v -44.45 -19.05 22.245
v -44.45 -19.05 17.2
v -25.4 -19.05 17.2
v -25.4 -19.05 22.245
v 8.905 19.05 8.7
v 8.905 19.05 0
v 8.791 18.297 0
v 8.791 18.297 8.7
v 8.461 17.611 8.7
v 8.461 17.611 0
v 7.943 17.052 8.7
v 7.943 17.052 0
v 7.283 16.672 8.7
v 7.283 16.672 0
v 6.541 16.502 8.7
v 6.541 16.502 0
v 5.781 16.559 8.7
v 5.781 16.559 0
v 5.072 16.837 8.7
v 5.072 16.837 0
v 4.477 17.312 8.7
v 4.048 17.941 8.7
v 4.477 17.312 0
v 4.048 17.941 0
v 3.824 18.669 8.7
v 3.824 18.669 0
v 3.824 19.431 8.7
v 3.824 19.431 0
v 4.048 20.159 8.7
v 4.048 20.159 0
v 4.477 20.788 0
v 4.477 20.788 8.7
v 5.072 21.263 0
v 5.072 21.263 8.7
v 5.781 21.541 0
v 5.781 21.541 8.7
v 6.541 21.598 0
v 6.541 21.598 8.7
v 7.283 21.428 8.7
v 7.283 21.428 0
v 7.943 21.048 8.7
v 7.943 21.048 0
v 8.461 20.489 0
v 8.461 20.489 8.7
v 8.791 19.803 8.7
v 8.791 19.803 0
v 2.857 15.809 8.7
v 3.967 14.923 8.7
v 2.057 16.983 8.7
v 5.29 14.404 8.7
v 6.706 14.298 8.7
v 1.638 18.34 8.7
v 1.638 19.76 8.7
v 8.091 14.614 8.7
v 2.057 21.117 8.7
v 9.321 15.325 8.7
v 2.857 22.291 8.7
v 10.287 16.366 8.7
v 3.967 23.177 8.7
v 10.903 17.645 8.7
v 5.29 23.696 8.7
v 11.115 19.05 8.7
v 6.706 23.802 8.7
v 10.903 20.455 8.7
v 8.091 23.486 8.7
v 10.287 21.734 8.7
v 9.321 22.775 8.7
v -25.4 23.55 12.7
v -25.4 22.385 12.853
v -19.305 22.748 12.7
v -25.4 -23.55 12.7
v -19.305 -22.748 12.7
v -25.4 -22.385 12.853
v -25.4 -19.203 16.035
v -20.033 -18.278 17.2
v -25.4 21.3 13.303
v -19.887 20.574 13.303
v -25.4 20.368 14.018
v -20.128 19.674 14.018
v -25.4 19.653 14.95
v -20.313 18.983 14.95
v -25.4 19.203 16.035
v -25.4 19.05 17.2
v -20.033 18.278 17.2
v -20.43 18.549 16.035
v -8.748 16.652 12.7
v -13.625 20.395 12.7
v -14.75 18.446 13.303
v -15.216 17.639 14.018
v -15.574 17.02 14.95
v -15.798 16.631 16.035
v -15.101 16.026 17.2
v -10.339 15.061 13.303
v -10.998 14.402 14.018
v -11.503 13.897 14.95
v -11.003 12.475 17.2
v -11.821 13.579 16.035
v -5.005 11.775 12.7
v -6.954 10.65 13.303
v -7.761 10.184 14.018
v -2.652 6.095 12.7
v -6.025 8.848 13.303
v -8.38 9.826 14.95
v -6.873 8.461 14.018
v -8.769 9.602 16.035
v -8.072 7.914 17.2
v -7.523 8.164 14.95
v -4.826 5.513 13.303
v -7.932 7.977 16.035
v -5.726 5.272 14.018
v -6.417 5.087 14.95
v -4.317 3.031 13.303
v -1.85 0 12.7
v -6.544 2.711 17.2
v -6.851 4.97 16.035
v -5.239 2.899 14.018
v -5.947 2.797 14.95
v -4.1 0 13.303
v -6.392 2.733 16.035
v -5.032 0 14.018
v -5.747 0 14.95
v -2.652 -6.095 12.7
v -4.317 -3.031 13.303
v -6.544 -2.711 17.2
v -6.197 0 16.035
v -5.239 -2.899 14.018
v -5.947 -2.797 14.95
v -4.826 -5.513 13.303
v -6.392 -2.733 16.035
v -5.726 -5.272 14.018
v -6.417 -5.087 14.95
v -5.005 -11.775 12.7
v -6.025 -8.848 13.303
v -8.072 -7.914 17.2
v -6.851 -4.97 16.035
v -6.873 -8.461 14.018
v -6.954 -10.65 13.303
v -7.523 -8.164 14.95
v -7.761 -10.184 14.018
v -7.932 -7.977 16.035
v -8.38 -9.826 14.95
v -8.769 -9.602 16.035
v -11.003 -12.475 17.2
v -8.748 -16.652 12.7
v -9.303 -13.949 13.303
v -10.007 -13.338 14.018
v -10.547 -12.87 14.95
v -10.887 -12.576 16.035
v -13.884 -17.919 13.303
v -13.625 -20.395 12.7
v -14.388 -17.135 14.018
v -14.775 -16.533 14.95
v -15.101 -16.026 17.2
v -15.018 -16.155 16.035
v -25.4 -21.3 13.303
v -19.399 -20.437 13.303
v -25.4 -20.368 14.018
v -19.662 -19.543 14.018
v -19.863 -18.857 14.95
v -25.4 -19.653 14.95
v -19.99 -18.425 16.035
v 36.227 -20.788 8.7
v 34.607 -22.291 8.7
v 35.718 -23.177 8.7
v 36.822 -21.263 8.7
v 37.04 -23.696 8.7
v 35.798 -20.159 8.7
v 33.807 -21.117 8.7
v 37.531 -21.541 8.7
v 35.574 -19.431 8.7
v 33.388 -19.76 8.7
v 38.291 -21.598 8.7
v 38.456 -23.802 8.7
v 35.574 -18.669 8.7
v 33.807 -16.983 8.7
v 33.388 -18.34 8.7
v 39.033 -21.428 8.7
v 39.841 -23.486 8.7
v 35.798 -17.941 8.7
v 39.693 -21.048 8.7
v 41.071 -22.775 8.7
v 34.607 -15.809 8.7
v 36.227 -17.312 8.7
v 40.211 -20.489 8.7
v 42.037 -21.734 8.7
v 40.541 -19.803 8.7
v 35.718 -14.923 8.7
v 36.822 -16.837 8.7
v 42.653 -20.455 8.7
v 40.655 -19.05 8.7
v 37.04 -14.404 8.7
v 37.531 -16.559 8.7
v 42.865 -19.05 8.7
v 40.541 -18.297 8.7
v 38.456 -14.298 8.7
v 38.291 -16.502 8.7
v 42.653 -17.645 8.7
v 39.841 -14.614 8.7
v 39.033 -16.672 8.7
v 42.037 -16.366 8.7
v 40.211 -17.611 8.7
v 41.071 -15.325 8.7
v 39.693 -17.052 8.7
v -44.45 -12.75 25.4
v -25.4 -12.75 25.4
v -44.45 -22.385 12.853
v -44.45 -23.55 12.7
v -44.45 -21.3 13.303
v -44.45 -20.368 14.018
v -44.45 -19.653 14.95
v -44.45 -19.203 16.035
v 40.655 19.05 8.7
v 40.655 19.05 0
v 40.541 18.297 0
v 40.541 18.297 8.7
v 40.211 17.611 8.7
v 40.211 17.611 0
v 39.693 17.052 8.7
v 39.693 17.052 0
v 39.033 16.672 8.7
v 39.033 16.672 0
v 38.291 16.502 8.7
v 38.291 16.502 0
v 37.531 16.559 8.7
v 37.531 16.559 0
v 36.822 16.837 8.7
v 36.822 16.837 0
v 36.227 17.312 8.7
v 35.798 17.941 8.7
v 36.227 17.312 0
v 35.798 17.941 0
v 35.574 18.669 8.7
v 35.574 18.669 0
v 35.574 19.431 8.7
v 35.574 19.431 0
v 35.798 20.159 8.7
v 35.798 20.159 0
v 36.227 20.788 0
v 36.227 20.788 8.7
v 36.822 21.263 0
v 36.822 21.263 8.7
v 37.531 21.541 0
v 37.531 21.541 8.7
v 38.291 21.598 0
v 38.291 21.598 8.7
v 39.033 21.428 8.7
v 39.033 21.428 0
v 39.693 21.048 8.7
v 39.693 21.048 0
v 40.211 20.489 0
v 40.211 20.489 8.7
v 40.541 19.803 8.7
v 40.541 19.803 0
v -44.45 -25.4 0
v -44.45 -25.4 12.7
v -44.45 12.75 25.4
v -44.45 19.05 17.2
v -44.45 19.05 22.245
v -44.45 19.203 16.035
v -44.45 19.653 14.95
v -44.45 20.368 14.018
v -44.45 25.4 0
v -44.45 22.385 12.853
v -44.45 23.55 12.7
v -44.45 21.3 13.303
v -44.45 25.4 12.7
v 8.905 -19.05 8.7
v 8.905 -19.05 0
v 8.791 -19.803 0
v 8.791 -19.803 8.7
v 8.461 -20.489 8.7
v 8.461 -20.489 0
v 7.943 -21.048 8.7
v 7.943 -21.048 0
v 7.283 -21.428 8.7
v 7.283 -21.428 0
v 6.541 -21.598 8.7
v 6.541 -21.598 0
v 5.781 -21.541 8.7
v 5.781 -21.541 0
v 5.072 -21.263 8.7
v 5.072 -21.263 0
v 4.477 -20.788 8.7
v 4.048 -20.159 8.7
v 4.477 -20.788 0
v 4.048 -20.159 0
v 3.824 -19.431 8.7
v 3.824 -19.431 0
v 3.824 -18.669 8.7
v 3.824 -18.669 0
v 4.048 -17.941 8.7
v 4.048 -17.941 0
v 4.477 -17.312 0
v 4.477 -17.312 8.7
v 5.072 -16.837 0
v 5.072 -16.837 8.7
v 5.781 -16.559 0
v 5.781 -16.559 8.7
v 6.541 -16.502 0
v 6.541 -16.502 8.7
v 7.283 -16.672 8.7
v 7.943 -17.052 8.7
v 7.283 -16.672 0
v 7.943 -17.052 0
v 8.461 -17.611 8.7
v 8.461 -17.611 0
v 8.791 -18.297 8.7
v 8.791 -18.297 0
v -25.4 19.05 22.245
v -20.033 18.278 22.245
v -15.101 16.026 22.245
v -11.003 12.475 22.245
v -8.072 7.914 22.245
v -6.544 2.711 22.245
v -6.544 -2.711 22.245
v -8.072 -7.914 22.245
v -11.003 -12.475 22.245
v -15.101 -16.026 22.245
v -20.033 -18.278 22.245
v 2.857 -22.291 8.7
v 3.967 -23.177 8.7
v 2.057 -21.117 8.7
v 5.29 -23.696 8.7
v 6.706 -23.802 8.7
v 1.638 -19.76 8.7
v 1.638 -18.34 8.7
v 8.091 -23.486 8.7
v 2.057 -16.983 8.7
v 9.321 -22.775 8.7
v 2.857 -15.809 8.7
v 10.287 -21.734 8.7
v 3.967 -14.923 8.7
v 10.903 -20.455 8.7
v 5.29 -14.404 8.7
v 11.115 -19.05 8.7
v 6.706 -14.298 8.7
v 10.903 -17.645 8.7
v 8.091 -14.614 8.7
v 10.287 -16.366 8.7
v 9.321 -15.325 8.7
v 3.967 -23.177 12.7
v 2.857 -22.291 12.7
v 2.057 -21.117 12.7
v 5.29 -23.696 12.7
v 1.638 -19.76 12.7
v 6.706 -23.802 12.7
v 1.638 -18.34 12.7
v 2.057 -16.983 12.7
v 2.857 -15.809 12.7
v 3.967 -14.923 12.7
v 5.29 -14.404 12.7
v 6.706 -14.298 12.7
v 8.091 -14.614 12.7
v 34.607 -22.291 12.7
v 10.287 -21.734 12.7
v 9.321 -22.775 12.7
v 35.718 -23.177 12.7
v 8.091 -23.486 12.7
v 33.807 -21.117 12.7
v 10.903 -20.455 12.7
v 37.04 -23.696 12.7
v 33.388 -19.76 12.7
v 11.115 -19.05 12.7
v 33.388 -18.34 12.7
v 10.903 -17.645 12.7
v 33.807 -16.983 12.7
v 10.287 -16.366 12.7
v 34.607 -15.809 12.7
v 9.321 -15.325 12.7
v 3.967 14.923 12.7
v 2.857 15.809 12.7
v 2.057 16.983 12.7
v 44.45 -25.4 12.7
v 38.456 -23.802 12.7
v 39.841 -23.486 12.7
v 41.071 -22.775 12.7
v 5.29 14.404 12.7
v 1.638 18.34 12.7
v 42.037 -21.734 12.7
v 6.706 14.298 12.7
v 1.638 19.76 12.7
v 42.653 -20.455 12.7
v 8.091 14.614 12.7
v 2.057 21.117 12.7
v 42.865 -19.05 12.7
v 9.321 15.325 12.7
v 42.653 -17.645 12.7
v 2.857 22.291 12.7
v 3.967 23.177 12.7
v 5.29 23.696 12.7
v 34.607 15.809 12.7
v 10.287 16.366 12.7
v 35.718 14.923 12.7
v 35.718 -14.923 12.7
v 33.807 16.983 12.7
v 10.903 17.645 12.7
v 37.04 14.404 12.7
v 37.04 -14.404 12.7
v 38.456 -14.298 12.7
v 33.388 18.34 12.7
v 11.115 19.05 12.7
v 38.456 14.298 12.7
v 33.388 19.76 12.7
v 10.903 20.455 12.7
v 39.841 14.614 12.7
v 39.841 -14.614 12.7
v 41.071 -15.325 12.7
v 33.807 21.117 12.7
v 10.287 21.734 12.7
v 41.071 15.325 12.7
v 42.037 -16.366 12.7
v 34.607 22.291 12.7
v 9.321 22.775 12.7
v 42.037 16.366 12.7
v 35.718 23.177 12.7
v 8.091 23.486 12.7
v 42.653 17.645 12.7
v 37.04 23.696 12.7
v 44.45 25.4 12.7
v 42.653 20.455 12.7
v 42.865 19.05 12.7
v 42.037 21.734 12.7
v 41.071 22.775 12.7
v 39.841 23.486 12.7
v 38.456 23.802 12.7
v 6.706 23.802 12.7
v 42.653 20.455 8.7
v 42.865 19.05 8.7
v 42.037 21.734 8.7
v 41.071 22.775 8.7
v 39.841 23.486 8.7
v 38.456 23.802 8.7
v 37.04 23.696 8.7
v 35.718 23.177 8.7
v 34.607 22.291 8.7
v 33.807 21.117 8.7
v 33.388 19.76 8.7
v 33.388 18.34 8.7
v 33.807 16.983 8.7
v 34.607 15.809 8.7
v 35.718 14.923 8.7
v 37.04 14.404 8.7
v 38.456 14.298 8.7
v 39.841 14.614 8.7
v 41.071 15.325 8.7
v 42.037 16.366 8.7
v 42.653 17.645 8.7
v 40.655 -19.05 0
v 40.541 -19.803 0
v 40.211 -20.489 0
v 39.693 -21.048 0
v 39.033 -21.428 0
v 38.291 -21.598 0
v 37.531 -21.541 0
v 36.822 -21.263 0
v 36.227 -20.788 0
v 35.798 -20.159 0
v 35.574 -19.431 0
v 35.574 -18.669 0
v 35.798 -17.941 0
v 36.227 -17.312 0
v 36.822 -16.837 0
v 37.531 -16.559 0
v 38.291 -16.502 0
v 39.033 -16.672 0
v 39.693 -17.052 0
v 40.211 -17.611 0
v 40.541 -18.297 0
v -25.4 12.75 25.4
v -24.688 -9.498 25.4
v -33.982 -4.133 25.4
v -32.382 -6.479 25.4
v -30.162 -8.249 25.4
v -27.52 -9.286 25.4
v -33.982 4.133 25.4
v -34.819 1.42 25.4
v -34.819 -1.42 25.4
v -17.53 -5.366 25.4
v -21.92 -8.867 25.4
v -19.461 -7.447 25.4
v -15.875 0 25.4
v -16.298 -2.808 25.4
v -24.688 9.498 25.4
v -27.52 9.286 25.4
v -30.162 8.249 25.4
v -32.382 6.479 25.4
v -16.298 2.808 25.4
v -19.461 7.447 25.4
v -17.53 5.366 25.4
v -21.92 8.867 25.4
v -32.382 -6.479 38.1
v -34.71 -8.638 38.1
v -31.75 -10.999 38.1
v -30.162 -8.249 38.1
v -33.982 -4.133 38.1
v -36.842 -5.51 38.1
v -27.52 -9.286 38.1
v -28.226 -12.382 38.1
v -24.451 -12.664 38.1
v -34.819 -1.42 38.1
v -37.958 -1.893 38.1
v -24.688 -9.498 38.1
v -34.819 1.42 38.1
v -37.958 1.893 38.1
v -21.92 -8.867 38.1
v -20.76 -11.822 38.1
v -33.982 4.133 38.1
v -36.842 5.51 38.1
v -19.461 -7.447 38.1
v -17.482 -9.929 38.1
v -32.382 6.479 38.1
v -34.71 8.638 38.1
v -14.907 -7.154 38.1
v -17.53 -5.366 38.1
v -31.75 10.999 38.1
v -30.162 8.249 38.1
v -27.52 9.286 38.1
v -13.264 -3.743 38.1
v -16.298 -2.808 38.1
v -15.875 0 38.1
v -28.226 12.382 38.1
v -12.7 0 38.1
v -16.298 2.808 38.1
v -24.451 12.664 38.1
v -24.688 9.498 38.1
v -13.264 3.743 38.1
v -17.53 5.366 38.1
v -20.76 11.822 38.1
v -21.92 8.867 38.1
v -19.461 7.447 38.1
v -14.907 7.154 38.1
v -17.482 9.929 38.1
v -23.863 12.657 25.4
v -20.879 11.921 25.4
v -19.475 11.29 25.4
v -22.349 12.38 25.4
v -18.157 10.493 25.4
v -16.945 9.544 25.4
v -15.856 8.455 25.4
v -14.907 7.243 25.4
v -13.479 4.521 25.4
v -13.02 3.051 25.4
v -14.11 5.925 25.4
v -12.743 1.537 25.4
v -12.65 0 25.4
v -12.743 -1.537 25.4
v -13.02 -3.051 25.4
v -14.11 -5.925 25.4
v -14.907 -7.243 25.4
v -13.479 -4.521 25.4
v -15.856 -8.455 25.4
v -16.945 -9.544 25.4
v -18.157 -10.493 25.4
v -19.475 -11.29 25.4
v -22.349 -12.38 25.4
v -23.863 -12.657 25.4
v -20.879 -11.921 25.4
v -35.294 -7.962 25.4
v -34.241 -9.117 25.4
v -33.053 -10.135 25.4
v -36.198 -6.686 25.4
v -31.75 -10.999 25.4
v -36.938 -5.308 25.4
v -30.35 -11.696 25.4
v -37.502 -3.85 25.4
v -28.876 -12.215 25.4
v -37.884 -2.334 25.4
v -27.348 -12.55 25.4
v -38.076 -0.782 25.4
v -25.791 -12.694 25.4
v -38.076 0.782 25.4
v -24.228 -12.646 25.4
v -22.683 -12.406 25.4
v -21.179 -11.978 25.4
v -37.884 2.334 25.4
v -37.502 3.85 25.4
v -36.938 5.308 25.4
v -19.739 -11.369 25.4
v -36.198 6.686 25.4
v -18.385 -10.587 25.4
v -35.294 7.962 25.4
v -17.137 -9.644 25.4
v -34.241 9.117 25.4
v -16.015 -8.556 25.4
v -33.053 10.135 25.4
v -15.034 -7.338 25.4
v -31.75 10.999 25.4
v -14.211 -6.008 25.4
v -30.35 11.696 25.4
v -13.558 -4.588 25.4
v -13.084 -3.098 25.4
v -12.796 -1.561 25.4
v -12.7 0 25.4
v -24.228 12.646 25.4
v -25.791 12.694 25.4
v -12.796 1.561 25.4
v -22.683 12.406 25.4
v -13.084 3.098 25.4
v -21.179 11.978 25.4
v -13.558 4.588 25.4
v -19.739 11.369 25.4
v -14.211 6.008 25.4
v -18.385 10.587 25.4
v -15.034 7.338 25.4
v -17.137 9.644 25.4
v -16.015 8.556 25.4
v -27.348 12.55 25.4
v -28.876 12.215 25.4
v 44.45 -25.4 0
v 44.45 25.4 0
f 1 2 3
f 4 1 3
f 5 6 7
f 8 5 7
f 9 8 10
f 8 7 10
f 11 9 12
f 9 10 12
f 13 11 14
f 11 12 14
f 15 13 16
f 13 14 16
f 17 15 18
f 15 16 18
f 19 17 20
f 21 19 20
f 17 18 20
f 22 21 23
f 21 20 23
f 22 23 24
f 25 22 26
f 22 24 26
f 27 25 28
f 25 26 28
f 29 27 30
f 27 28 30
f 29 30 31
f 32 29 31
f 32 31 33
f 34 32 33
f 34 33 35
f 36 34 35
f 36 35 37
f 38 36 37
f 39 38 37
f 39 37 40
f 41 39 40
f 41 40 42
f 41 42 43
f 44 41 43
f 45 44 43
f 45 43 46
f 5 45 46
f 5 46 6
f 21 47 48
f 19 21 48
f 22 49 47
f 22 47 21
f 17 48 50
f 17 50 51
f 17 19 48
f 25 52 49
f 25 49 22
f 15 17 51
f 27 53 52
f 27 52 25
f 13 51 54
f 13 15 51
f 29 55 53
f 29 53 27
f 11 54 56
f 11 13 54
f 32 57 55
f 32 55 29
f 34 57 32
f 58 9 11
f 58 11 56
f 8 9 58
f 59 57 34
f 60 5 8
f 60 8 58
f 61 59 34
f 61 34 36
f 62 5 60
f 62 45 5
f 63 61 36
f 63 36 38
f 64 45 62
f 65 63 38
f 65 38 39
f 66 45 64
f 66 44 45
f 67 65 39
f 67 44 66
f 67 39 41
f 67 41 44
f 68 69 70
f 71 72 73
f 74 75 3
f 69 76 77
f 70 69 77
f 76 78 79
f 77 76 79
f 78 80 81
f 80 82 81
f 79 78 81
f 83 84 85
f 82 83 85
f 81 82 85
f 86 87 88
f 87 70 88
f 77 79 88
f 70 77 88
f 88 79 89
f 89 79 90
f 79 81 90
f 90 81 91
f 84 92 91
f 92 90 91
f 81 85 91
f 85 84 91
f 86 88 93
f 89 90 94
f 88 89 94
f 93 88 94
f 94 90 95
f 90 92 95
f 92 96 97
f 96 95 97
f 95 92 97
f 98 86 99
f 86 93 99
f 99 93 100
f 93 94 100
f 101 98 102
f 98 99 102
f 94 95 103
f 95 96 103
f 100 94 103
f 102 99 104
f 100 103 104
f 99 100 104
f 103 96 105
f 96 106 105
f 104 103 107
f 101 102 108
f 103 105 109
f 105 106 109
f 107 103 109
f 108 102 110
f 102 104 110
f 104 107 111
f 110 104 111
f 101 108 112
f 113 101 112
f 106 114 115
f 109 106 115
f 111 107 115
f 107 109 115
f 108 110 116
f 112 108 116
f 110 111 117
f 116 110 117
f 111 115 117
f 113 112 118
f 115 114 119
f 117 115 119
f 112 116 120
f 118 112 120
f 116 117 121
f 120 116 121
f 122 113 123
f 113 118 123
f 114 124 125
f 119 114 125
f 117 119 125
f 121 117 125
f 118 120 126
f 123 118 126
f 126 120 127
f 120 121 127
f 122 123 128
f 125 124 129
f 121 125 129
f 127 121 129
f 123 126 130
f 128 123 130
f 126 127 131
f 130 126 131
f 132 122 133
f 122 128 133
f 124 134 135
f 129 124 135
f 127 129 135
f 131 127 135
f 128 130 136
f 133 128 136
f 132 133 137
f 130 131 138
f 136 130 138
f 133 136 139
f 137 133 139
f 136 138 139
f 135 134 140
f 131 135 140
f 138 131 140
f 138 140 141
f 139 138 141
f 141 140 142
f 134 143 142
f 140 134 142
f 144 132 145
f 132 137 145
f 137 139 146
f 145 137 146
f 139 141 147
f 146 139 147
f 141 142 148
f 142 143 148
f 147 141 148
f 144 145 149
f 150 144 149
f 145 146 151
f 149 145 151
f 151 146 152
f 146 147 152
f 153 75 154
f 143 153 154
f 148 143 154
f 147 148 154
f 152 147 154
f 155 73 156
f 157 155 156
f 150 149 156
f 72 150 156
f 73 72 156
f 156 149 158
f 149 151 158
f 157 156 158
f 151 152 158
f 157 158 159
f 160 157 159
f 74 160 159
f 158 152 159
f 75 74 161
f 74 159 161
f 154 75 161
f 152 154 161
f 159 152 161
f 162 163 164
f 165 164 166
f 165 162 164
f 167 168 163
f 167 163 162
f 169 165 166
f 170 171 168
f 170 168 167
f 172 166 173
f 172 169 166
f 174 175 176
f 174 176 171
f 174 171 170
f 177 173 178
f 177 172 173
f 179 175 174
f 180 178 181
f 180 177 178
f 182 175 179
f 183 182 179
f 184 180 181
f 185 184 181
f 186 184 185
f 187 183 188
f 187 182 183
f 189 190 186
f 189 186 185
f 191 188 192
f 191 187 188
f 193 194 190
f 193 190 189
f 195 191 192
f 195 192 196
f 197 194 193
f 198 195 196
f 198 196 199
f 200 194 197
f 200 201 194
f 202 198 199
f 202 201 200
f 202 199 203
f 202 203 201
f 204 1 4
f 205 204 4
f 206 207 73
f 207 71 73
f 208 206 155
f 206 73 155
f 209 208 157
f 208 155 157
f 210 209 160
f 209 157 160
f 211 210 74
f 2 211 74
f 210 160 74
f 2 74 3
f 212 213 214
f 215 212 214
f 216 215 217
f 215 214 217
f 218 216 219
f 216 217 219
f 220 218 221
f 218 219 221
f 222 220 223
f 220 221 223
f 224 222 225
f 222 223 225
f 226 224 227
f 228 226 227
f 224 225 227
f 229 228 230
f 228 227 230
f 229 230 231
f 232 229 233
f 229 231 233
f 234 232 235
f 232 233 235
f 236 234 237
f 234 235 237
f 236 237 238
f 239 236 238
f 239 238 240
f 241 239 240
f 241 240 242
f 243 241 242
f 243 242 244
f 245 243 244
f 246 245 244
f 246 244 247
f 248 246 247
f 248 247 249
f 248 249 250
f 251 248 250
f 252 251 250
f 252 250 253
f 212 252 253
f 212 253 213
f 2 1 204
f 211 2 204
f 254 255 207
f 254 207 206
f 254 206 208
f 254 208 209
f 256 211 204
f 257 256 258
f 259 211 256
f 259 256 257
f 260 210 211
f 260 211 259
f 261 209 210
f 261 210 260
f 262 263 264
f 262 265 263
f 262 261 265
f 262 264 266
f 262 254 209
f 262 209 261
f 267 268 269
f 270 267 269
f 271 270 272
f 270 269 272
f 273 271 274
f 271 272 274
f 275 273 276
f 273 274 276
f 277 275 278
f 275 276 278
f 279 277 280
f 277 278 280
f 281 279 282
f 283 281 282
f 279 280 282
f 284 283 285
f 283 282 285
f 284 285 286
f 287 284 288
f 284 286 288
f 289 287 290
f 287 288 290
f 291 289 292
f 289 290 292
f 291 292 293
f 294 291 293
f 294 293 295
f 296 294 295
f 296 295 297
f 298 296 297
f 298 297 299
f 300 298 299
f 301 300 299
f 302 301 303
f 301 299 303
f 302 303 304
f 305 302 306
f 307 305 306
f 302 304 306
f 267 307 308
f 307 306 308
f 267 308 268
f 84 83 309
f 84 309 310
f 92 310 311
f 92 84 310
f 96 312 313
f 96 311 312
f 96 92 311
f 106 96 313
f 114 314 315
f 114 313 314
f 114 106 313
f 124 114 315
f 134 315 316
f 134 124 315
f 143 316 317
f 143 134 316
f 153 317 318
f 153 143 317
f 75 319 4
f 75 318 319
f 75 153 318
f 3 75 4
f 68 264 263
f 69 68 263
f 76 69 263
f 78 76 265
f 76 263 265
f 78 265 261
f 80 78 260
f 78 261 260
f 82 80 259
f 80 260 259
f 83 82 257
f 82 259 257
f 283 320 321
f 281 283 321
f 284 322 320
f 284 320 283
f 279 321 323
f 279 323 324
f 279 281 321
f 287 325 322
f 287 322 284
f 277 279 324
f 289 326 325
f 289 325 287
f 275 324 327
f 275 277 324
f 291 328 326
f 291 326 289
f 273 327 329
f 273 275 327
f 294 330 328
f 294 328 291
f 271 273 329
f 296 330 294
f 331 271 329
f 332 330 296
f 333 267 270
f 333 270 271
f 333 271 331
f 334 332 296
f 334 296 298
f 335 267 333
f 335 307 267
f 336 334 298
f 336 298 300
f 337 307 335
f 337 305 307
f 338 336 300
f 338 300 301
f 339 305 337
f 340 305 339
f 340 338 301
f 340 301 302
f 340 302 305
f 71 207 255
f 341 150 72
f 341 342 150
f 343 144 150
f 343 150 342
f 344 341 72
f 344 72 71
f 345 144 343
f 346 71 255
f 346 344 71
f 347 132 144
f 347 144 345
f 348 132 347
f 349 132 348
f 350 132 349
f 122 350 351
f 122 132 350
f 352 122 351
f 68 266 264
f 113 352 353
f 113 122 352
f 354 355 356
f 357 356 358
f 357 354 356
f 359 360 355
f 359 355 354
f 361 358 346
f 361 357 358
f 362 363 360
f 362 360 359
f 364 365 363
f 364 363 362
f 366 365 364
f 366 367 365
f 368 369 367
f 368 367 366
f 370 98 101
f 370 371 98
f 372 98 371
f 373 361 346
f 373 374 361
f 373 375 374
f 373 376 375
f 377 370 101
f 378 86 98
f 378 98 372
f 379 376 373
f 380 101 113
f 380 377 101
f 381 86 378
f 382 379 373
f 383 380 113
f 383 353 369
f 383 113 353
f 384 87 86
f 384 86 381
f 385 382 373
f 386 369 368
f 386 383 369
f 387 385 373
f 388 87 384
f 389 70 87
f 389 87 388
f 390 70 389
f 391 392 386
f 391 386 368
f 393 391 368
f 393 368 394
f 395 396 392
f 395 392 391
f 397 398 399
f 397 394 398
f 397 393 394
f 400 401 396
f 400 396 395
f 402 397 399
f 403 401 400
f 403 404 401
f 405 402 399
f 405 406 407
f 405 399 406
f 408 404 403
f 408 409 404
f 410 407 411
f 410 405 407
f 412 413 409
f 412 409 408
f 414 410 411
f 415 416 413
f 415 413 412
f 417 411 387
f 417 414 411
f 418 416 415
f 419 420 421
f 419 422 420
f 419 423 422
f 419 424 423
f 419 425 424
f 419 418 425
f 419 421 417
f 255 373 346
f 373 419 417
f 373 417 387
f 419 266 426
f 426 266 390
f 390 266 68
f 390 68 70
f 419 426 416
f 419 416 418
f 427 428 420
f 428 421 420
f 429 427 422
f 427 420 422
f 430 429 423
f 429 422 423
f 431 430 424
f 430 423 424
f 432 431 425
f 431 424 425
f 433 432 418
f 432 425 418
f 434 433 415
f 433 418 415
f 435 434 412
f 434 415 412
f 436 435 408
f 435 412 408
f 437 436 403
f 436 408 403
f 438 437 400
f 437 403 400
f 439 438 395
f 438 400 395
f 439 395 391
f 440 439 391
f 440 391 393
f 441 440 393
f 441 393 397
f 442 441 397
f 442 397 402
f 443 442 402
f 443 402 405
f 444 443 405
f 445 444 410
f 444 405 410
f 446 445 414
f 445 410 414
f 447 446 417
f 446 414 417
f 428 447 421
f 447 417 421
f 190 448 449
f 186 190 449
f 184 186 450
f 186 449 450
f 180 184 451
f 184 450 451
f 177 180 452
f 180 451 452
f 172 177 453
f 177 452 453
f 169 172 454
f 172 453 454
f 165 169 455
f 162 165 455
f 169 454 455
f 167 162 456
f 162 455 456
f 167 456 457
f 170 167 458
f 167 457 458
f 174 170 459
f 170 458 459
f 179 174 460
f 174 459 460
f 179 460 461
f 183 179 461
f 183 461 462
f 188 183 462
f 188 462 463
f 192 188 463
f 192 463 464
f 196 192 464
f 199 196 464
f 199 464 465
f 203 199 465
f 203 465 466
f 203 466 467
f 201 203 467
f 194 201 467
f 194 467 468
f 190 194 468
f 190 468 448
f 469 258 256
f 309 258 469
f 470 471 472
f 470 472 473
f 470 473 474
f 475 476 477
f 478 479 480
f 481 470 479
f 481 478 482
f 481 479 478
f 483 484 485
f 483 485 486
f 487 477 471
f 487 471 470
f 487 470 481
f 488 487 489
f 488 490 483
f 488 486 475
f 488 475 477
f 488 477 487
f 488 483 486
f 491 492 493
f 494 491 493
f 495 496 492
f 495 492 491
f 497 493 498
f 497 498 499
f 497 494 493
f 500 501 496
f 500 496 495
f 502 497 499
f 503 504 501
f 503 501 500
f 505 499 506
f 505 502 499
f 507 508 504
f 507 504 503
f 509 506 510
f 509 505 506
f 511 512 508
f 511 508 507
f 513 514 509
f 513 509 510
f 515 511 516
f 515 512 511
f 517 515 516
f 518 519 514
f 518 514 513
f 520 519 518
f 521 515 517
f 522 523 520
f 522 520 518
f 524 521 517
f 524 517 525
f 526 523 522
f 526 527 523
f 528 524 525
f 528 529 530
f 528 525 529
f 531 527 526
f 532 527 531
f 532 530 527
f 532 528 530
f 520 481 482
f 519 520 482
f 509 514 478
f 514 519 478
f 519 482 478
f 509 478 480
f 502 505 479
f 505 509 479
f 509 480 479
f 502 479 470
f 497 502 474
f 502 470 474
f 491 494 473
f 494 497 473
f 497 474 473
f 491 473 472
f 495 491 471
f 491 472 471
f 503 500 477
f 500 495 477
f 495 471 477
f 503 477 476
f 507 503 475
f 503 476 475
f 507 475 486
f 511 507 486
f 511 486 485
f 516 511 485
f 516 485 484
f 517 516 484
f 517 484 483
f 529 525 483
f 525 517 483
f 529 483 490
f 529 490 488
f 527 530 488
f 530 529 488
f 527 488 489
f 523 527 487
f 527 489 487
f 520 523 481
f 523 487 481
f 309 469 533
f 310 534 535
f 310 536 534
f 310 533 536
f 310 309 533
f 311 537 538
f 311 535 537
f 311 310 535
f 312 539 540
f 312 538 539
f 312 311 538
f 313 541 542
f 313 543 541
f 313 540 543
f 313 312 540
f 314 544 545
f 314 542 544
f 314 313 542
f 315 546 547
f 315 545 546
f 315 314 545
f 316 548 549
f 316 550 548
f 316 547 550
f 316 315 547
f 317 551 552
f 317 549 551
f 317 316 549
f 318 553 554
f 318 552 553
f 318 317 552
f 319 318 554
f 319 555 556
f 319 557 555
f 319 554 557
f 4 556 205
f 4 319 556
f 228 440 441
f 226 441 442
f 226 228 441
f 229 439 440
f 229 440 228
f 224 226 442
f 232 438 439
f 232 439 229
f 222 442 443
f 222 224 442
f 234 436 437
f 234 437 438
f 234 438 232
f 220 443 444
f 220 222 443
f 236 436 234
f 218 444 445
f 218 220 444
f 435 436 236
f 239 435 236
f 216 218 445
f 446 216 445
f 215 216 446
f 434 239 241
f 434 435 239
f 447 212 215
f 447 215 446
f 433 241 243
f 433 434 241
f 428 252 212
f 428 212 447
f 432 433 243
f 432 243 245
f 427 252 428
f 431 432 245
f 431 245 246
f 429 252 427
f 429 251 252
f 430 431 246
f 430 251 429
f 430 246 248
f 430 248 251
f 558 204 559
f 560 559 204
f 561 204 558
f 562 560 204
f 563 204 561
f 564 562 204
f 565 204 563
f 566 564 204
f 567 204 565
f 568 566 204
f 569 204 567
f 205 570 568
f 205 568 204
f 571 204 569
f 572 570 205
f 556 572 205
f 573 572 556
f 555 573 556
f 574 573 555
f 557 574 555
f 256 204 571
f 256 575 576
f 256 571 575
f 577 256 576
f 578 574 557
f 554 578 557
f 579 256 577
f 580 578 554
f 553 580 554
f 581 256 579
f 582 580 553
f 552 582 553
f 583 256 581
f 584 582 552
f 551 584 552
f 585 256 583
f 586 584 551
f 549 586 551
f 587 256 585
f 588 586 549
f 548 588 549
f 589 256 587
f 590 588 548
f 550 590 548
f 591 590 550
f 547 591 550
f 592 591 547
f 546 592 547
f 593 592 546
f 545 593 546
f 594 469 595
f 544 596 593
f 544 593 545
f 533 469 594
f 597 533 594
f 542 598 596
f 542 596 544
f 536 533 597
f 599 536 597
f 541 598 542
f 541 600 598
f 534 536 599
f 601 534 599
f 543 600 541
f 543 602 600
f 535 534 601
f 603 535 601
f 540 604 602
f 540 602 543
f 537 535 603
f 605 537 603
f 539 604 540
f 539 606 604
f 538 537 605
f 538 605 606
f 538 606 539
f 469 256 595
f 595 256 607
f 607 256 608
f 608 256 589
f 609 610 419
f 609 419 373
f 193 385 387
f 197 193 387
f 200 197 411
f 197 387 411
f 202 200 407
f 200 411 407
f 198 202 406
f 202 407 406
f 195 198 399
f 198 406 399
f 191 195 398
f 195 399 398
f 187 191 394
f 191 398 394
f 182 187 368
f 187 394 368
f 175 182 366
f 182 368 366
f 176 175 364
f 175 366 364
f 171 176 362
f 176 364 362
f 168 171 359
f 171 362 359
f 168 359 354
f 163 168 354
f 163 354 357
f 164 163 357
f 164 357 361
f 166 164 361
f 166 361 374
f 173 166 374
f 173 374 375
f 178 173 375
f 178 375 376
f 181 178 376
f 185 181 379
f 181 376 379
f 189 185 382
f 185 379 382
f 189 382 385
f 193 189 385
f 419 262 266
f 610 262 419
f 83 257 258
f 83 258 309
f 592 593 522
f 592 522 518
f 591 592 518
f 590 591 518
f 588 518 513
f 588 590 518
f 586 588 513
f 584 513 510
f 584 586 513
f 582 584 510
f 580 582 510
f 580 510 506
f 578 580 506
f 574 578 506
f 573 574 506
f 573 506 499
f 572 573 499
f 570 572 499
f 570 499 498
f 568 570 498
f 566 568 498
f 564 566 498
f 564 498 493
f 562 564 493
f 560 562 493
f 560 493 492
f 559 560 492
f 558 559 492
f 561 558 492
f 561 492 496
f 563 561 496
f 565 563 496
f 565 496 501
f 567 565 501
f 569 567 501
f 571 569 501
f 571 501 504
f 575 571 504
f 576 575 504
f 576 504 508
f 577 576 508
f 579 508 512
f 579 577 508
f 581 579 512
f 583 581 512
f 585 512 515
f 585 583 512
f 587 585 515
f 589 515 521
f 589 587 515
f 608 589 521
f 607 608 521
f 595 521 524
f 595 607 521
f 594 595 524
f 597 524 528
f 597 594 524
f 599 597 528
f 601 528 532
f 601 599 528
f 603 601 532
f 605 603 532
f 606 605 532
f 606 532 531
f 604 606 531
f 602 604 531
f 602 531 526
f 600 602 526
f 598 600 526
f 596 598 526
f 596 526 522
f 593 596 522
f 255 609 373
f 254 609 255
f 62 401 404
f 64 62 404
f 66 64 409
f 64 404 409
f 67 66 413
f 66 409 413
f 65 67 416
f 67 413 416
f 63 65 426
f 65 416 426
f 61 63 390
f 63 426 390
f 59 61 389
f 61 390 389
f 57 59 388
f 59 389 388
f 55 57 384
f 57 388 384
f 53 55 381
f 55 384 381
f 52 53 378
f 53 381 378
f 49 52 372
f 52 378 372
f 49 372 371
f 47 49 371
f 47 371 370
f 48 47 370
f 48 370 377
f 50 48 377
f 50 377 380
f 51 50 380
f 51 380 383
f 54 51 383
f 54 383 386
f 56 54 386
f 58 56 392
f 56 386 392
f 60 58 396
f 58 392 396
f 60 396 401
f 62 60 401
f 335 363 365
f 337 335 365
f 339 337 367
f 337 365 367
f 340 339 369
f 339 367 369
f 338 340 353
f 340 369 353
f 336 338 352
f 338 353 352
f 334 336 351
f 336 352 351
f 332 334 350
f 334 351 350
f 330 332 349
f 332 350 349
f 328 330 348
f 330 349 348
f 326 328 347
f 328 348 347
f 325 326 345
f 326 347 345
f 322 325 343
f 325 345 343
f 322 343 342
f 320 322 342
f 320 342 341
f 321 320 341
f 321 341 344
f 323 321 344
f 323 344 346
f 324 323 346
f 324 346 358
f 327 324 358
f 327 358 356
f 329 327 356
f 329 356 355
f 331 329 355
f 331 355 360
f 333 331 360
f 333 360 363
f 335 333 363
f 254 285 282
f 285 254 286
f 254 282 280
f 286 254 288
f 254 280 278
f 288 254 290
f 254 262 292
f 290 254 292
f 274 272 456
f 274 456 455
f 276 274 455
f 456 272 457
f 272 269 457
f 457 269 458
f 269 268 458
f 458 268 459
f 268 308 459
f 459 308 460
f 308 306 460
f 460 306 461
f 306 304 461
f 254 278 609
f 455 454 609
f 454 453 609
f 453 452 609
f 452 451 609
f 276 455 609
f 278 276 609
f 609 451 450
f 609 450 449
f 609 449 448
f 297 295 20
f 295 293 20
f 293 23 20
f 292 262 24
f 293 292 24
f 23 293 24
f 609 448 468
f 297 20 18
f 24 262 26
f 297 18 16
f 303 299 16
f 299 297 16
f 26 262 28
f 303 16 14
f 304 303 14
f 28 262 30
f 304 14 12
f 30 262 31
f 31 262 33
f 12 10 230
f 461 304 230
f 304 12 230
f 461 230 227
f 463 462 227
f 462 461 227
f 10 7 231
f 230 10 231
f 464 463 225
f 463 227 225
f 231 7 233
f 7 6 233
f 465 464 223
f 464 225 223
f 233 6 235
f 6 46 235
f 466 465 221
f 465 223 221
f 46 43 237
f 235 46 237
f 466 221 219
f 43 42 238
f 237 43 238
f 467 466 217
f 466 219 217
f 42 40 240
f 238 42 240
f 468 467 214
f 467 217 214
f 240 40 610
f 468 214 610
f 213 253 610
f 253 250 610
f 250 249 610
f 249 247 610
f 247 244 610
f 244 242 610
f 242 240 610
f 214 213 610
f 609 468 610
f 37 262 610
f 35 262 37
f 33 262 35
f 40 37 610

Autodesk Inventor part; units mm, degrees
ref_plane "YZ Plane" through (0, 0, 0) normal (1, 0, 0) x (0, 1, 0)
ref_plane "XZ Plane" through (0, 0, 0) normal (0, 1, 0) x (-1, 0, 0)
ref_plane "XY Plane" through (0, 0, 0) normal (0, 0, 1) x (1, 0, 0)
sketch "Sketch1" plane through (0, 0, 0) normal (0, 0, 1) x (1, 0, 0)
  line L0 (-273.2587, 58.9048) -> (-103.4873, 58.9048) construction
  line L1 (-103.4873, 58.9048) -> (-103.4873, -61.7557) construction
  line L2 (-103.4873, -61.7557) -> (-273.2587, -61.7557) construction
  line L3 (-273.2587, -61.7557) -> (-273.2587, 58.9048) construction
  line L4 (-44.45, 25.4) -> (44.45, 25.4)
  line L5 (44.45, 25.4) -> (44.45, -25.4)
  line L6 (44.45, -25.4) -> (-44.45, -25.4)
  line L7 (-44.45, -25.4) -> (-44.45, 25.4)
  line L8 (-44.45, 25.4) -> (44.45, -25.4) construction
  line L9 (44.45, 25.4) -> (-44.45, -25.4) construction
  circle A0 centre (38.1, 19.05) radius 2.555
  circle A1 centre (6.35, 19.05) radius 2.555
  line L10 (0, 0) -> (70.2377, 0)
  circle A2 centre (38.1, -19.05) radius 2.555
  circle A3 centre (6.35, -19.05) radius 2.555
  dimension "d5" = 88.9
  dimension "d6" = 50.8
  dimension "d7" = 5.11
  dimension "d8" = 6.35
  dimension "d9" = 6.35
  dimension "d11" = 5.11
extrude "Extrusion1" add sketch "Sketch1" along normal blind 12.7
sketch "Sketch2" plane through (0, 0, 12.7) normal (0, 0, 1) x (1, 0, 0)
  circle A0 centre (6.35, 19.05) radius 2.555 projected
  circle A1 centre (6.35, 19.05) radius 4.765
  circle A2 centre (38.1, 19.05) radius 2.555 projected
  circle A3 centre (38.1, 19.05) radius 4.765
  circle A4 centre (6.35, -19.05) radius 2.555 projected
  circle A5 centre (6.35, -19.05) radius 4.765
  circle A6 centre (38.1, -19.05) radius 2.555 projected
  circle A7 centre (38.1, -19.05) radius 4.765
  point P0 (0, 0)
  dimension "d19" = 9.53
  dimension "d20" = 9.53
  dimension "d21" = 9.53
  dimension "d22" = 9.53
extrude "Extrusion2" cut sketch "Sketch2" against normal blind 4 contours A0 | A1 | A2 | A3 | A4 | A5 | A6 | A7
sketch "Sketch3" plane through (0, 0, 12.7) normal (0, 0, 1) x (1, 0, 0)
  line L0 (-44.45, 25.4) -> (-44.45, -25.4) projected
  line L1 (-44.45, -19.05) -> (-25.4, -19.05)
  line L2 (-44.45, 19.05) -> (-25.4, 19.05)
  arc A0 (-25.4, -19.05) -> (-25.4, 19.05) centre (-25.4, 0) ccw
  line L3 (-44.45, -19.05) -> (-44.45, 19.05)
  point P0 (0, 0)
  dimension "d25" = 19.05
  dimension "d26" = 19.05
  dimension "d29" = 19.05
extrude "Extrusion3" add sketch "Sketch3" along normal blind 12.7
fillet "Face Fillet1" radius 4.5 1 edges at (-34.925, -19.05, 12.7)
sketch "Sketch4" plane through (0, 0, 25.4) normal (0, 0, 1) x (1, 0, 0)
  arc A0 (-25.4, -19.05) -> (-25.4, 19.05) centre (-25.4, 0) ccw projected
  line L0 (-44.45, 19.05) -> (-44.45, -19.05) projected
  line L1 (-44.45, -12.7) -> (-44.45, 12.7)
  point P0 (0, 0)
extrude "Extrusion4" [suppressed]
sketch "Sketch5" plane through (0, 0, 25.4) normal (0, 0, 1) x (1, 0, 0)
  arc A0 (-25.4, -19.05) -> (-25.4, 19.05) centre (-25.4, 0) ccw projected
  circle A1 centre (-25.4, 0) radius 12.7
  circle A2 centre (-25.4, 0) radius 9.525
  point P0 (0, 0)
  dimension "d38" = 25.4
  dimension "d39" = 19.05
extrude "Extrusion5" add sketch "Sketch5" along normal blind 12.7
chamfer "Chamfer1" distance 6.3 angle 26.6 3 edges at (-34.925, -19.05, 25.4) (-6.35, 0, 25.4) (-34.925, 19.05, 25.4) measured on face at (-42.3333, 0, 25.4)
sketch "Sketch6" plane through (-25.4, 0, 25.4) normal (0, 0, 1) x (1, 0, 0)
  circle A0 centre (0, 0) radius 9.525 projected
  circle A1 centre (0, 0) radius 9.525
  point P0 (25.4, 0)
properties part number "cad@49"
